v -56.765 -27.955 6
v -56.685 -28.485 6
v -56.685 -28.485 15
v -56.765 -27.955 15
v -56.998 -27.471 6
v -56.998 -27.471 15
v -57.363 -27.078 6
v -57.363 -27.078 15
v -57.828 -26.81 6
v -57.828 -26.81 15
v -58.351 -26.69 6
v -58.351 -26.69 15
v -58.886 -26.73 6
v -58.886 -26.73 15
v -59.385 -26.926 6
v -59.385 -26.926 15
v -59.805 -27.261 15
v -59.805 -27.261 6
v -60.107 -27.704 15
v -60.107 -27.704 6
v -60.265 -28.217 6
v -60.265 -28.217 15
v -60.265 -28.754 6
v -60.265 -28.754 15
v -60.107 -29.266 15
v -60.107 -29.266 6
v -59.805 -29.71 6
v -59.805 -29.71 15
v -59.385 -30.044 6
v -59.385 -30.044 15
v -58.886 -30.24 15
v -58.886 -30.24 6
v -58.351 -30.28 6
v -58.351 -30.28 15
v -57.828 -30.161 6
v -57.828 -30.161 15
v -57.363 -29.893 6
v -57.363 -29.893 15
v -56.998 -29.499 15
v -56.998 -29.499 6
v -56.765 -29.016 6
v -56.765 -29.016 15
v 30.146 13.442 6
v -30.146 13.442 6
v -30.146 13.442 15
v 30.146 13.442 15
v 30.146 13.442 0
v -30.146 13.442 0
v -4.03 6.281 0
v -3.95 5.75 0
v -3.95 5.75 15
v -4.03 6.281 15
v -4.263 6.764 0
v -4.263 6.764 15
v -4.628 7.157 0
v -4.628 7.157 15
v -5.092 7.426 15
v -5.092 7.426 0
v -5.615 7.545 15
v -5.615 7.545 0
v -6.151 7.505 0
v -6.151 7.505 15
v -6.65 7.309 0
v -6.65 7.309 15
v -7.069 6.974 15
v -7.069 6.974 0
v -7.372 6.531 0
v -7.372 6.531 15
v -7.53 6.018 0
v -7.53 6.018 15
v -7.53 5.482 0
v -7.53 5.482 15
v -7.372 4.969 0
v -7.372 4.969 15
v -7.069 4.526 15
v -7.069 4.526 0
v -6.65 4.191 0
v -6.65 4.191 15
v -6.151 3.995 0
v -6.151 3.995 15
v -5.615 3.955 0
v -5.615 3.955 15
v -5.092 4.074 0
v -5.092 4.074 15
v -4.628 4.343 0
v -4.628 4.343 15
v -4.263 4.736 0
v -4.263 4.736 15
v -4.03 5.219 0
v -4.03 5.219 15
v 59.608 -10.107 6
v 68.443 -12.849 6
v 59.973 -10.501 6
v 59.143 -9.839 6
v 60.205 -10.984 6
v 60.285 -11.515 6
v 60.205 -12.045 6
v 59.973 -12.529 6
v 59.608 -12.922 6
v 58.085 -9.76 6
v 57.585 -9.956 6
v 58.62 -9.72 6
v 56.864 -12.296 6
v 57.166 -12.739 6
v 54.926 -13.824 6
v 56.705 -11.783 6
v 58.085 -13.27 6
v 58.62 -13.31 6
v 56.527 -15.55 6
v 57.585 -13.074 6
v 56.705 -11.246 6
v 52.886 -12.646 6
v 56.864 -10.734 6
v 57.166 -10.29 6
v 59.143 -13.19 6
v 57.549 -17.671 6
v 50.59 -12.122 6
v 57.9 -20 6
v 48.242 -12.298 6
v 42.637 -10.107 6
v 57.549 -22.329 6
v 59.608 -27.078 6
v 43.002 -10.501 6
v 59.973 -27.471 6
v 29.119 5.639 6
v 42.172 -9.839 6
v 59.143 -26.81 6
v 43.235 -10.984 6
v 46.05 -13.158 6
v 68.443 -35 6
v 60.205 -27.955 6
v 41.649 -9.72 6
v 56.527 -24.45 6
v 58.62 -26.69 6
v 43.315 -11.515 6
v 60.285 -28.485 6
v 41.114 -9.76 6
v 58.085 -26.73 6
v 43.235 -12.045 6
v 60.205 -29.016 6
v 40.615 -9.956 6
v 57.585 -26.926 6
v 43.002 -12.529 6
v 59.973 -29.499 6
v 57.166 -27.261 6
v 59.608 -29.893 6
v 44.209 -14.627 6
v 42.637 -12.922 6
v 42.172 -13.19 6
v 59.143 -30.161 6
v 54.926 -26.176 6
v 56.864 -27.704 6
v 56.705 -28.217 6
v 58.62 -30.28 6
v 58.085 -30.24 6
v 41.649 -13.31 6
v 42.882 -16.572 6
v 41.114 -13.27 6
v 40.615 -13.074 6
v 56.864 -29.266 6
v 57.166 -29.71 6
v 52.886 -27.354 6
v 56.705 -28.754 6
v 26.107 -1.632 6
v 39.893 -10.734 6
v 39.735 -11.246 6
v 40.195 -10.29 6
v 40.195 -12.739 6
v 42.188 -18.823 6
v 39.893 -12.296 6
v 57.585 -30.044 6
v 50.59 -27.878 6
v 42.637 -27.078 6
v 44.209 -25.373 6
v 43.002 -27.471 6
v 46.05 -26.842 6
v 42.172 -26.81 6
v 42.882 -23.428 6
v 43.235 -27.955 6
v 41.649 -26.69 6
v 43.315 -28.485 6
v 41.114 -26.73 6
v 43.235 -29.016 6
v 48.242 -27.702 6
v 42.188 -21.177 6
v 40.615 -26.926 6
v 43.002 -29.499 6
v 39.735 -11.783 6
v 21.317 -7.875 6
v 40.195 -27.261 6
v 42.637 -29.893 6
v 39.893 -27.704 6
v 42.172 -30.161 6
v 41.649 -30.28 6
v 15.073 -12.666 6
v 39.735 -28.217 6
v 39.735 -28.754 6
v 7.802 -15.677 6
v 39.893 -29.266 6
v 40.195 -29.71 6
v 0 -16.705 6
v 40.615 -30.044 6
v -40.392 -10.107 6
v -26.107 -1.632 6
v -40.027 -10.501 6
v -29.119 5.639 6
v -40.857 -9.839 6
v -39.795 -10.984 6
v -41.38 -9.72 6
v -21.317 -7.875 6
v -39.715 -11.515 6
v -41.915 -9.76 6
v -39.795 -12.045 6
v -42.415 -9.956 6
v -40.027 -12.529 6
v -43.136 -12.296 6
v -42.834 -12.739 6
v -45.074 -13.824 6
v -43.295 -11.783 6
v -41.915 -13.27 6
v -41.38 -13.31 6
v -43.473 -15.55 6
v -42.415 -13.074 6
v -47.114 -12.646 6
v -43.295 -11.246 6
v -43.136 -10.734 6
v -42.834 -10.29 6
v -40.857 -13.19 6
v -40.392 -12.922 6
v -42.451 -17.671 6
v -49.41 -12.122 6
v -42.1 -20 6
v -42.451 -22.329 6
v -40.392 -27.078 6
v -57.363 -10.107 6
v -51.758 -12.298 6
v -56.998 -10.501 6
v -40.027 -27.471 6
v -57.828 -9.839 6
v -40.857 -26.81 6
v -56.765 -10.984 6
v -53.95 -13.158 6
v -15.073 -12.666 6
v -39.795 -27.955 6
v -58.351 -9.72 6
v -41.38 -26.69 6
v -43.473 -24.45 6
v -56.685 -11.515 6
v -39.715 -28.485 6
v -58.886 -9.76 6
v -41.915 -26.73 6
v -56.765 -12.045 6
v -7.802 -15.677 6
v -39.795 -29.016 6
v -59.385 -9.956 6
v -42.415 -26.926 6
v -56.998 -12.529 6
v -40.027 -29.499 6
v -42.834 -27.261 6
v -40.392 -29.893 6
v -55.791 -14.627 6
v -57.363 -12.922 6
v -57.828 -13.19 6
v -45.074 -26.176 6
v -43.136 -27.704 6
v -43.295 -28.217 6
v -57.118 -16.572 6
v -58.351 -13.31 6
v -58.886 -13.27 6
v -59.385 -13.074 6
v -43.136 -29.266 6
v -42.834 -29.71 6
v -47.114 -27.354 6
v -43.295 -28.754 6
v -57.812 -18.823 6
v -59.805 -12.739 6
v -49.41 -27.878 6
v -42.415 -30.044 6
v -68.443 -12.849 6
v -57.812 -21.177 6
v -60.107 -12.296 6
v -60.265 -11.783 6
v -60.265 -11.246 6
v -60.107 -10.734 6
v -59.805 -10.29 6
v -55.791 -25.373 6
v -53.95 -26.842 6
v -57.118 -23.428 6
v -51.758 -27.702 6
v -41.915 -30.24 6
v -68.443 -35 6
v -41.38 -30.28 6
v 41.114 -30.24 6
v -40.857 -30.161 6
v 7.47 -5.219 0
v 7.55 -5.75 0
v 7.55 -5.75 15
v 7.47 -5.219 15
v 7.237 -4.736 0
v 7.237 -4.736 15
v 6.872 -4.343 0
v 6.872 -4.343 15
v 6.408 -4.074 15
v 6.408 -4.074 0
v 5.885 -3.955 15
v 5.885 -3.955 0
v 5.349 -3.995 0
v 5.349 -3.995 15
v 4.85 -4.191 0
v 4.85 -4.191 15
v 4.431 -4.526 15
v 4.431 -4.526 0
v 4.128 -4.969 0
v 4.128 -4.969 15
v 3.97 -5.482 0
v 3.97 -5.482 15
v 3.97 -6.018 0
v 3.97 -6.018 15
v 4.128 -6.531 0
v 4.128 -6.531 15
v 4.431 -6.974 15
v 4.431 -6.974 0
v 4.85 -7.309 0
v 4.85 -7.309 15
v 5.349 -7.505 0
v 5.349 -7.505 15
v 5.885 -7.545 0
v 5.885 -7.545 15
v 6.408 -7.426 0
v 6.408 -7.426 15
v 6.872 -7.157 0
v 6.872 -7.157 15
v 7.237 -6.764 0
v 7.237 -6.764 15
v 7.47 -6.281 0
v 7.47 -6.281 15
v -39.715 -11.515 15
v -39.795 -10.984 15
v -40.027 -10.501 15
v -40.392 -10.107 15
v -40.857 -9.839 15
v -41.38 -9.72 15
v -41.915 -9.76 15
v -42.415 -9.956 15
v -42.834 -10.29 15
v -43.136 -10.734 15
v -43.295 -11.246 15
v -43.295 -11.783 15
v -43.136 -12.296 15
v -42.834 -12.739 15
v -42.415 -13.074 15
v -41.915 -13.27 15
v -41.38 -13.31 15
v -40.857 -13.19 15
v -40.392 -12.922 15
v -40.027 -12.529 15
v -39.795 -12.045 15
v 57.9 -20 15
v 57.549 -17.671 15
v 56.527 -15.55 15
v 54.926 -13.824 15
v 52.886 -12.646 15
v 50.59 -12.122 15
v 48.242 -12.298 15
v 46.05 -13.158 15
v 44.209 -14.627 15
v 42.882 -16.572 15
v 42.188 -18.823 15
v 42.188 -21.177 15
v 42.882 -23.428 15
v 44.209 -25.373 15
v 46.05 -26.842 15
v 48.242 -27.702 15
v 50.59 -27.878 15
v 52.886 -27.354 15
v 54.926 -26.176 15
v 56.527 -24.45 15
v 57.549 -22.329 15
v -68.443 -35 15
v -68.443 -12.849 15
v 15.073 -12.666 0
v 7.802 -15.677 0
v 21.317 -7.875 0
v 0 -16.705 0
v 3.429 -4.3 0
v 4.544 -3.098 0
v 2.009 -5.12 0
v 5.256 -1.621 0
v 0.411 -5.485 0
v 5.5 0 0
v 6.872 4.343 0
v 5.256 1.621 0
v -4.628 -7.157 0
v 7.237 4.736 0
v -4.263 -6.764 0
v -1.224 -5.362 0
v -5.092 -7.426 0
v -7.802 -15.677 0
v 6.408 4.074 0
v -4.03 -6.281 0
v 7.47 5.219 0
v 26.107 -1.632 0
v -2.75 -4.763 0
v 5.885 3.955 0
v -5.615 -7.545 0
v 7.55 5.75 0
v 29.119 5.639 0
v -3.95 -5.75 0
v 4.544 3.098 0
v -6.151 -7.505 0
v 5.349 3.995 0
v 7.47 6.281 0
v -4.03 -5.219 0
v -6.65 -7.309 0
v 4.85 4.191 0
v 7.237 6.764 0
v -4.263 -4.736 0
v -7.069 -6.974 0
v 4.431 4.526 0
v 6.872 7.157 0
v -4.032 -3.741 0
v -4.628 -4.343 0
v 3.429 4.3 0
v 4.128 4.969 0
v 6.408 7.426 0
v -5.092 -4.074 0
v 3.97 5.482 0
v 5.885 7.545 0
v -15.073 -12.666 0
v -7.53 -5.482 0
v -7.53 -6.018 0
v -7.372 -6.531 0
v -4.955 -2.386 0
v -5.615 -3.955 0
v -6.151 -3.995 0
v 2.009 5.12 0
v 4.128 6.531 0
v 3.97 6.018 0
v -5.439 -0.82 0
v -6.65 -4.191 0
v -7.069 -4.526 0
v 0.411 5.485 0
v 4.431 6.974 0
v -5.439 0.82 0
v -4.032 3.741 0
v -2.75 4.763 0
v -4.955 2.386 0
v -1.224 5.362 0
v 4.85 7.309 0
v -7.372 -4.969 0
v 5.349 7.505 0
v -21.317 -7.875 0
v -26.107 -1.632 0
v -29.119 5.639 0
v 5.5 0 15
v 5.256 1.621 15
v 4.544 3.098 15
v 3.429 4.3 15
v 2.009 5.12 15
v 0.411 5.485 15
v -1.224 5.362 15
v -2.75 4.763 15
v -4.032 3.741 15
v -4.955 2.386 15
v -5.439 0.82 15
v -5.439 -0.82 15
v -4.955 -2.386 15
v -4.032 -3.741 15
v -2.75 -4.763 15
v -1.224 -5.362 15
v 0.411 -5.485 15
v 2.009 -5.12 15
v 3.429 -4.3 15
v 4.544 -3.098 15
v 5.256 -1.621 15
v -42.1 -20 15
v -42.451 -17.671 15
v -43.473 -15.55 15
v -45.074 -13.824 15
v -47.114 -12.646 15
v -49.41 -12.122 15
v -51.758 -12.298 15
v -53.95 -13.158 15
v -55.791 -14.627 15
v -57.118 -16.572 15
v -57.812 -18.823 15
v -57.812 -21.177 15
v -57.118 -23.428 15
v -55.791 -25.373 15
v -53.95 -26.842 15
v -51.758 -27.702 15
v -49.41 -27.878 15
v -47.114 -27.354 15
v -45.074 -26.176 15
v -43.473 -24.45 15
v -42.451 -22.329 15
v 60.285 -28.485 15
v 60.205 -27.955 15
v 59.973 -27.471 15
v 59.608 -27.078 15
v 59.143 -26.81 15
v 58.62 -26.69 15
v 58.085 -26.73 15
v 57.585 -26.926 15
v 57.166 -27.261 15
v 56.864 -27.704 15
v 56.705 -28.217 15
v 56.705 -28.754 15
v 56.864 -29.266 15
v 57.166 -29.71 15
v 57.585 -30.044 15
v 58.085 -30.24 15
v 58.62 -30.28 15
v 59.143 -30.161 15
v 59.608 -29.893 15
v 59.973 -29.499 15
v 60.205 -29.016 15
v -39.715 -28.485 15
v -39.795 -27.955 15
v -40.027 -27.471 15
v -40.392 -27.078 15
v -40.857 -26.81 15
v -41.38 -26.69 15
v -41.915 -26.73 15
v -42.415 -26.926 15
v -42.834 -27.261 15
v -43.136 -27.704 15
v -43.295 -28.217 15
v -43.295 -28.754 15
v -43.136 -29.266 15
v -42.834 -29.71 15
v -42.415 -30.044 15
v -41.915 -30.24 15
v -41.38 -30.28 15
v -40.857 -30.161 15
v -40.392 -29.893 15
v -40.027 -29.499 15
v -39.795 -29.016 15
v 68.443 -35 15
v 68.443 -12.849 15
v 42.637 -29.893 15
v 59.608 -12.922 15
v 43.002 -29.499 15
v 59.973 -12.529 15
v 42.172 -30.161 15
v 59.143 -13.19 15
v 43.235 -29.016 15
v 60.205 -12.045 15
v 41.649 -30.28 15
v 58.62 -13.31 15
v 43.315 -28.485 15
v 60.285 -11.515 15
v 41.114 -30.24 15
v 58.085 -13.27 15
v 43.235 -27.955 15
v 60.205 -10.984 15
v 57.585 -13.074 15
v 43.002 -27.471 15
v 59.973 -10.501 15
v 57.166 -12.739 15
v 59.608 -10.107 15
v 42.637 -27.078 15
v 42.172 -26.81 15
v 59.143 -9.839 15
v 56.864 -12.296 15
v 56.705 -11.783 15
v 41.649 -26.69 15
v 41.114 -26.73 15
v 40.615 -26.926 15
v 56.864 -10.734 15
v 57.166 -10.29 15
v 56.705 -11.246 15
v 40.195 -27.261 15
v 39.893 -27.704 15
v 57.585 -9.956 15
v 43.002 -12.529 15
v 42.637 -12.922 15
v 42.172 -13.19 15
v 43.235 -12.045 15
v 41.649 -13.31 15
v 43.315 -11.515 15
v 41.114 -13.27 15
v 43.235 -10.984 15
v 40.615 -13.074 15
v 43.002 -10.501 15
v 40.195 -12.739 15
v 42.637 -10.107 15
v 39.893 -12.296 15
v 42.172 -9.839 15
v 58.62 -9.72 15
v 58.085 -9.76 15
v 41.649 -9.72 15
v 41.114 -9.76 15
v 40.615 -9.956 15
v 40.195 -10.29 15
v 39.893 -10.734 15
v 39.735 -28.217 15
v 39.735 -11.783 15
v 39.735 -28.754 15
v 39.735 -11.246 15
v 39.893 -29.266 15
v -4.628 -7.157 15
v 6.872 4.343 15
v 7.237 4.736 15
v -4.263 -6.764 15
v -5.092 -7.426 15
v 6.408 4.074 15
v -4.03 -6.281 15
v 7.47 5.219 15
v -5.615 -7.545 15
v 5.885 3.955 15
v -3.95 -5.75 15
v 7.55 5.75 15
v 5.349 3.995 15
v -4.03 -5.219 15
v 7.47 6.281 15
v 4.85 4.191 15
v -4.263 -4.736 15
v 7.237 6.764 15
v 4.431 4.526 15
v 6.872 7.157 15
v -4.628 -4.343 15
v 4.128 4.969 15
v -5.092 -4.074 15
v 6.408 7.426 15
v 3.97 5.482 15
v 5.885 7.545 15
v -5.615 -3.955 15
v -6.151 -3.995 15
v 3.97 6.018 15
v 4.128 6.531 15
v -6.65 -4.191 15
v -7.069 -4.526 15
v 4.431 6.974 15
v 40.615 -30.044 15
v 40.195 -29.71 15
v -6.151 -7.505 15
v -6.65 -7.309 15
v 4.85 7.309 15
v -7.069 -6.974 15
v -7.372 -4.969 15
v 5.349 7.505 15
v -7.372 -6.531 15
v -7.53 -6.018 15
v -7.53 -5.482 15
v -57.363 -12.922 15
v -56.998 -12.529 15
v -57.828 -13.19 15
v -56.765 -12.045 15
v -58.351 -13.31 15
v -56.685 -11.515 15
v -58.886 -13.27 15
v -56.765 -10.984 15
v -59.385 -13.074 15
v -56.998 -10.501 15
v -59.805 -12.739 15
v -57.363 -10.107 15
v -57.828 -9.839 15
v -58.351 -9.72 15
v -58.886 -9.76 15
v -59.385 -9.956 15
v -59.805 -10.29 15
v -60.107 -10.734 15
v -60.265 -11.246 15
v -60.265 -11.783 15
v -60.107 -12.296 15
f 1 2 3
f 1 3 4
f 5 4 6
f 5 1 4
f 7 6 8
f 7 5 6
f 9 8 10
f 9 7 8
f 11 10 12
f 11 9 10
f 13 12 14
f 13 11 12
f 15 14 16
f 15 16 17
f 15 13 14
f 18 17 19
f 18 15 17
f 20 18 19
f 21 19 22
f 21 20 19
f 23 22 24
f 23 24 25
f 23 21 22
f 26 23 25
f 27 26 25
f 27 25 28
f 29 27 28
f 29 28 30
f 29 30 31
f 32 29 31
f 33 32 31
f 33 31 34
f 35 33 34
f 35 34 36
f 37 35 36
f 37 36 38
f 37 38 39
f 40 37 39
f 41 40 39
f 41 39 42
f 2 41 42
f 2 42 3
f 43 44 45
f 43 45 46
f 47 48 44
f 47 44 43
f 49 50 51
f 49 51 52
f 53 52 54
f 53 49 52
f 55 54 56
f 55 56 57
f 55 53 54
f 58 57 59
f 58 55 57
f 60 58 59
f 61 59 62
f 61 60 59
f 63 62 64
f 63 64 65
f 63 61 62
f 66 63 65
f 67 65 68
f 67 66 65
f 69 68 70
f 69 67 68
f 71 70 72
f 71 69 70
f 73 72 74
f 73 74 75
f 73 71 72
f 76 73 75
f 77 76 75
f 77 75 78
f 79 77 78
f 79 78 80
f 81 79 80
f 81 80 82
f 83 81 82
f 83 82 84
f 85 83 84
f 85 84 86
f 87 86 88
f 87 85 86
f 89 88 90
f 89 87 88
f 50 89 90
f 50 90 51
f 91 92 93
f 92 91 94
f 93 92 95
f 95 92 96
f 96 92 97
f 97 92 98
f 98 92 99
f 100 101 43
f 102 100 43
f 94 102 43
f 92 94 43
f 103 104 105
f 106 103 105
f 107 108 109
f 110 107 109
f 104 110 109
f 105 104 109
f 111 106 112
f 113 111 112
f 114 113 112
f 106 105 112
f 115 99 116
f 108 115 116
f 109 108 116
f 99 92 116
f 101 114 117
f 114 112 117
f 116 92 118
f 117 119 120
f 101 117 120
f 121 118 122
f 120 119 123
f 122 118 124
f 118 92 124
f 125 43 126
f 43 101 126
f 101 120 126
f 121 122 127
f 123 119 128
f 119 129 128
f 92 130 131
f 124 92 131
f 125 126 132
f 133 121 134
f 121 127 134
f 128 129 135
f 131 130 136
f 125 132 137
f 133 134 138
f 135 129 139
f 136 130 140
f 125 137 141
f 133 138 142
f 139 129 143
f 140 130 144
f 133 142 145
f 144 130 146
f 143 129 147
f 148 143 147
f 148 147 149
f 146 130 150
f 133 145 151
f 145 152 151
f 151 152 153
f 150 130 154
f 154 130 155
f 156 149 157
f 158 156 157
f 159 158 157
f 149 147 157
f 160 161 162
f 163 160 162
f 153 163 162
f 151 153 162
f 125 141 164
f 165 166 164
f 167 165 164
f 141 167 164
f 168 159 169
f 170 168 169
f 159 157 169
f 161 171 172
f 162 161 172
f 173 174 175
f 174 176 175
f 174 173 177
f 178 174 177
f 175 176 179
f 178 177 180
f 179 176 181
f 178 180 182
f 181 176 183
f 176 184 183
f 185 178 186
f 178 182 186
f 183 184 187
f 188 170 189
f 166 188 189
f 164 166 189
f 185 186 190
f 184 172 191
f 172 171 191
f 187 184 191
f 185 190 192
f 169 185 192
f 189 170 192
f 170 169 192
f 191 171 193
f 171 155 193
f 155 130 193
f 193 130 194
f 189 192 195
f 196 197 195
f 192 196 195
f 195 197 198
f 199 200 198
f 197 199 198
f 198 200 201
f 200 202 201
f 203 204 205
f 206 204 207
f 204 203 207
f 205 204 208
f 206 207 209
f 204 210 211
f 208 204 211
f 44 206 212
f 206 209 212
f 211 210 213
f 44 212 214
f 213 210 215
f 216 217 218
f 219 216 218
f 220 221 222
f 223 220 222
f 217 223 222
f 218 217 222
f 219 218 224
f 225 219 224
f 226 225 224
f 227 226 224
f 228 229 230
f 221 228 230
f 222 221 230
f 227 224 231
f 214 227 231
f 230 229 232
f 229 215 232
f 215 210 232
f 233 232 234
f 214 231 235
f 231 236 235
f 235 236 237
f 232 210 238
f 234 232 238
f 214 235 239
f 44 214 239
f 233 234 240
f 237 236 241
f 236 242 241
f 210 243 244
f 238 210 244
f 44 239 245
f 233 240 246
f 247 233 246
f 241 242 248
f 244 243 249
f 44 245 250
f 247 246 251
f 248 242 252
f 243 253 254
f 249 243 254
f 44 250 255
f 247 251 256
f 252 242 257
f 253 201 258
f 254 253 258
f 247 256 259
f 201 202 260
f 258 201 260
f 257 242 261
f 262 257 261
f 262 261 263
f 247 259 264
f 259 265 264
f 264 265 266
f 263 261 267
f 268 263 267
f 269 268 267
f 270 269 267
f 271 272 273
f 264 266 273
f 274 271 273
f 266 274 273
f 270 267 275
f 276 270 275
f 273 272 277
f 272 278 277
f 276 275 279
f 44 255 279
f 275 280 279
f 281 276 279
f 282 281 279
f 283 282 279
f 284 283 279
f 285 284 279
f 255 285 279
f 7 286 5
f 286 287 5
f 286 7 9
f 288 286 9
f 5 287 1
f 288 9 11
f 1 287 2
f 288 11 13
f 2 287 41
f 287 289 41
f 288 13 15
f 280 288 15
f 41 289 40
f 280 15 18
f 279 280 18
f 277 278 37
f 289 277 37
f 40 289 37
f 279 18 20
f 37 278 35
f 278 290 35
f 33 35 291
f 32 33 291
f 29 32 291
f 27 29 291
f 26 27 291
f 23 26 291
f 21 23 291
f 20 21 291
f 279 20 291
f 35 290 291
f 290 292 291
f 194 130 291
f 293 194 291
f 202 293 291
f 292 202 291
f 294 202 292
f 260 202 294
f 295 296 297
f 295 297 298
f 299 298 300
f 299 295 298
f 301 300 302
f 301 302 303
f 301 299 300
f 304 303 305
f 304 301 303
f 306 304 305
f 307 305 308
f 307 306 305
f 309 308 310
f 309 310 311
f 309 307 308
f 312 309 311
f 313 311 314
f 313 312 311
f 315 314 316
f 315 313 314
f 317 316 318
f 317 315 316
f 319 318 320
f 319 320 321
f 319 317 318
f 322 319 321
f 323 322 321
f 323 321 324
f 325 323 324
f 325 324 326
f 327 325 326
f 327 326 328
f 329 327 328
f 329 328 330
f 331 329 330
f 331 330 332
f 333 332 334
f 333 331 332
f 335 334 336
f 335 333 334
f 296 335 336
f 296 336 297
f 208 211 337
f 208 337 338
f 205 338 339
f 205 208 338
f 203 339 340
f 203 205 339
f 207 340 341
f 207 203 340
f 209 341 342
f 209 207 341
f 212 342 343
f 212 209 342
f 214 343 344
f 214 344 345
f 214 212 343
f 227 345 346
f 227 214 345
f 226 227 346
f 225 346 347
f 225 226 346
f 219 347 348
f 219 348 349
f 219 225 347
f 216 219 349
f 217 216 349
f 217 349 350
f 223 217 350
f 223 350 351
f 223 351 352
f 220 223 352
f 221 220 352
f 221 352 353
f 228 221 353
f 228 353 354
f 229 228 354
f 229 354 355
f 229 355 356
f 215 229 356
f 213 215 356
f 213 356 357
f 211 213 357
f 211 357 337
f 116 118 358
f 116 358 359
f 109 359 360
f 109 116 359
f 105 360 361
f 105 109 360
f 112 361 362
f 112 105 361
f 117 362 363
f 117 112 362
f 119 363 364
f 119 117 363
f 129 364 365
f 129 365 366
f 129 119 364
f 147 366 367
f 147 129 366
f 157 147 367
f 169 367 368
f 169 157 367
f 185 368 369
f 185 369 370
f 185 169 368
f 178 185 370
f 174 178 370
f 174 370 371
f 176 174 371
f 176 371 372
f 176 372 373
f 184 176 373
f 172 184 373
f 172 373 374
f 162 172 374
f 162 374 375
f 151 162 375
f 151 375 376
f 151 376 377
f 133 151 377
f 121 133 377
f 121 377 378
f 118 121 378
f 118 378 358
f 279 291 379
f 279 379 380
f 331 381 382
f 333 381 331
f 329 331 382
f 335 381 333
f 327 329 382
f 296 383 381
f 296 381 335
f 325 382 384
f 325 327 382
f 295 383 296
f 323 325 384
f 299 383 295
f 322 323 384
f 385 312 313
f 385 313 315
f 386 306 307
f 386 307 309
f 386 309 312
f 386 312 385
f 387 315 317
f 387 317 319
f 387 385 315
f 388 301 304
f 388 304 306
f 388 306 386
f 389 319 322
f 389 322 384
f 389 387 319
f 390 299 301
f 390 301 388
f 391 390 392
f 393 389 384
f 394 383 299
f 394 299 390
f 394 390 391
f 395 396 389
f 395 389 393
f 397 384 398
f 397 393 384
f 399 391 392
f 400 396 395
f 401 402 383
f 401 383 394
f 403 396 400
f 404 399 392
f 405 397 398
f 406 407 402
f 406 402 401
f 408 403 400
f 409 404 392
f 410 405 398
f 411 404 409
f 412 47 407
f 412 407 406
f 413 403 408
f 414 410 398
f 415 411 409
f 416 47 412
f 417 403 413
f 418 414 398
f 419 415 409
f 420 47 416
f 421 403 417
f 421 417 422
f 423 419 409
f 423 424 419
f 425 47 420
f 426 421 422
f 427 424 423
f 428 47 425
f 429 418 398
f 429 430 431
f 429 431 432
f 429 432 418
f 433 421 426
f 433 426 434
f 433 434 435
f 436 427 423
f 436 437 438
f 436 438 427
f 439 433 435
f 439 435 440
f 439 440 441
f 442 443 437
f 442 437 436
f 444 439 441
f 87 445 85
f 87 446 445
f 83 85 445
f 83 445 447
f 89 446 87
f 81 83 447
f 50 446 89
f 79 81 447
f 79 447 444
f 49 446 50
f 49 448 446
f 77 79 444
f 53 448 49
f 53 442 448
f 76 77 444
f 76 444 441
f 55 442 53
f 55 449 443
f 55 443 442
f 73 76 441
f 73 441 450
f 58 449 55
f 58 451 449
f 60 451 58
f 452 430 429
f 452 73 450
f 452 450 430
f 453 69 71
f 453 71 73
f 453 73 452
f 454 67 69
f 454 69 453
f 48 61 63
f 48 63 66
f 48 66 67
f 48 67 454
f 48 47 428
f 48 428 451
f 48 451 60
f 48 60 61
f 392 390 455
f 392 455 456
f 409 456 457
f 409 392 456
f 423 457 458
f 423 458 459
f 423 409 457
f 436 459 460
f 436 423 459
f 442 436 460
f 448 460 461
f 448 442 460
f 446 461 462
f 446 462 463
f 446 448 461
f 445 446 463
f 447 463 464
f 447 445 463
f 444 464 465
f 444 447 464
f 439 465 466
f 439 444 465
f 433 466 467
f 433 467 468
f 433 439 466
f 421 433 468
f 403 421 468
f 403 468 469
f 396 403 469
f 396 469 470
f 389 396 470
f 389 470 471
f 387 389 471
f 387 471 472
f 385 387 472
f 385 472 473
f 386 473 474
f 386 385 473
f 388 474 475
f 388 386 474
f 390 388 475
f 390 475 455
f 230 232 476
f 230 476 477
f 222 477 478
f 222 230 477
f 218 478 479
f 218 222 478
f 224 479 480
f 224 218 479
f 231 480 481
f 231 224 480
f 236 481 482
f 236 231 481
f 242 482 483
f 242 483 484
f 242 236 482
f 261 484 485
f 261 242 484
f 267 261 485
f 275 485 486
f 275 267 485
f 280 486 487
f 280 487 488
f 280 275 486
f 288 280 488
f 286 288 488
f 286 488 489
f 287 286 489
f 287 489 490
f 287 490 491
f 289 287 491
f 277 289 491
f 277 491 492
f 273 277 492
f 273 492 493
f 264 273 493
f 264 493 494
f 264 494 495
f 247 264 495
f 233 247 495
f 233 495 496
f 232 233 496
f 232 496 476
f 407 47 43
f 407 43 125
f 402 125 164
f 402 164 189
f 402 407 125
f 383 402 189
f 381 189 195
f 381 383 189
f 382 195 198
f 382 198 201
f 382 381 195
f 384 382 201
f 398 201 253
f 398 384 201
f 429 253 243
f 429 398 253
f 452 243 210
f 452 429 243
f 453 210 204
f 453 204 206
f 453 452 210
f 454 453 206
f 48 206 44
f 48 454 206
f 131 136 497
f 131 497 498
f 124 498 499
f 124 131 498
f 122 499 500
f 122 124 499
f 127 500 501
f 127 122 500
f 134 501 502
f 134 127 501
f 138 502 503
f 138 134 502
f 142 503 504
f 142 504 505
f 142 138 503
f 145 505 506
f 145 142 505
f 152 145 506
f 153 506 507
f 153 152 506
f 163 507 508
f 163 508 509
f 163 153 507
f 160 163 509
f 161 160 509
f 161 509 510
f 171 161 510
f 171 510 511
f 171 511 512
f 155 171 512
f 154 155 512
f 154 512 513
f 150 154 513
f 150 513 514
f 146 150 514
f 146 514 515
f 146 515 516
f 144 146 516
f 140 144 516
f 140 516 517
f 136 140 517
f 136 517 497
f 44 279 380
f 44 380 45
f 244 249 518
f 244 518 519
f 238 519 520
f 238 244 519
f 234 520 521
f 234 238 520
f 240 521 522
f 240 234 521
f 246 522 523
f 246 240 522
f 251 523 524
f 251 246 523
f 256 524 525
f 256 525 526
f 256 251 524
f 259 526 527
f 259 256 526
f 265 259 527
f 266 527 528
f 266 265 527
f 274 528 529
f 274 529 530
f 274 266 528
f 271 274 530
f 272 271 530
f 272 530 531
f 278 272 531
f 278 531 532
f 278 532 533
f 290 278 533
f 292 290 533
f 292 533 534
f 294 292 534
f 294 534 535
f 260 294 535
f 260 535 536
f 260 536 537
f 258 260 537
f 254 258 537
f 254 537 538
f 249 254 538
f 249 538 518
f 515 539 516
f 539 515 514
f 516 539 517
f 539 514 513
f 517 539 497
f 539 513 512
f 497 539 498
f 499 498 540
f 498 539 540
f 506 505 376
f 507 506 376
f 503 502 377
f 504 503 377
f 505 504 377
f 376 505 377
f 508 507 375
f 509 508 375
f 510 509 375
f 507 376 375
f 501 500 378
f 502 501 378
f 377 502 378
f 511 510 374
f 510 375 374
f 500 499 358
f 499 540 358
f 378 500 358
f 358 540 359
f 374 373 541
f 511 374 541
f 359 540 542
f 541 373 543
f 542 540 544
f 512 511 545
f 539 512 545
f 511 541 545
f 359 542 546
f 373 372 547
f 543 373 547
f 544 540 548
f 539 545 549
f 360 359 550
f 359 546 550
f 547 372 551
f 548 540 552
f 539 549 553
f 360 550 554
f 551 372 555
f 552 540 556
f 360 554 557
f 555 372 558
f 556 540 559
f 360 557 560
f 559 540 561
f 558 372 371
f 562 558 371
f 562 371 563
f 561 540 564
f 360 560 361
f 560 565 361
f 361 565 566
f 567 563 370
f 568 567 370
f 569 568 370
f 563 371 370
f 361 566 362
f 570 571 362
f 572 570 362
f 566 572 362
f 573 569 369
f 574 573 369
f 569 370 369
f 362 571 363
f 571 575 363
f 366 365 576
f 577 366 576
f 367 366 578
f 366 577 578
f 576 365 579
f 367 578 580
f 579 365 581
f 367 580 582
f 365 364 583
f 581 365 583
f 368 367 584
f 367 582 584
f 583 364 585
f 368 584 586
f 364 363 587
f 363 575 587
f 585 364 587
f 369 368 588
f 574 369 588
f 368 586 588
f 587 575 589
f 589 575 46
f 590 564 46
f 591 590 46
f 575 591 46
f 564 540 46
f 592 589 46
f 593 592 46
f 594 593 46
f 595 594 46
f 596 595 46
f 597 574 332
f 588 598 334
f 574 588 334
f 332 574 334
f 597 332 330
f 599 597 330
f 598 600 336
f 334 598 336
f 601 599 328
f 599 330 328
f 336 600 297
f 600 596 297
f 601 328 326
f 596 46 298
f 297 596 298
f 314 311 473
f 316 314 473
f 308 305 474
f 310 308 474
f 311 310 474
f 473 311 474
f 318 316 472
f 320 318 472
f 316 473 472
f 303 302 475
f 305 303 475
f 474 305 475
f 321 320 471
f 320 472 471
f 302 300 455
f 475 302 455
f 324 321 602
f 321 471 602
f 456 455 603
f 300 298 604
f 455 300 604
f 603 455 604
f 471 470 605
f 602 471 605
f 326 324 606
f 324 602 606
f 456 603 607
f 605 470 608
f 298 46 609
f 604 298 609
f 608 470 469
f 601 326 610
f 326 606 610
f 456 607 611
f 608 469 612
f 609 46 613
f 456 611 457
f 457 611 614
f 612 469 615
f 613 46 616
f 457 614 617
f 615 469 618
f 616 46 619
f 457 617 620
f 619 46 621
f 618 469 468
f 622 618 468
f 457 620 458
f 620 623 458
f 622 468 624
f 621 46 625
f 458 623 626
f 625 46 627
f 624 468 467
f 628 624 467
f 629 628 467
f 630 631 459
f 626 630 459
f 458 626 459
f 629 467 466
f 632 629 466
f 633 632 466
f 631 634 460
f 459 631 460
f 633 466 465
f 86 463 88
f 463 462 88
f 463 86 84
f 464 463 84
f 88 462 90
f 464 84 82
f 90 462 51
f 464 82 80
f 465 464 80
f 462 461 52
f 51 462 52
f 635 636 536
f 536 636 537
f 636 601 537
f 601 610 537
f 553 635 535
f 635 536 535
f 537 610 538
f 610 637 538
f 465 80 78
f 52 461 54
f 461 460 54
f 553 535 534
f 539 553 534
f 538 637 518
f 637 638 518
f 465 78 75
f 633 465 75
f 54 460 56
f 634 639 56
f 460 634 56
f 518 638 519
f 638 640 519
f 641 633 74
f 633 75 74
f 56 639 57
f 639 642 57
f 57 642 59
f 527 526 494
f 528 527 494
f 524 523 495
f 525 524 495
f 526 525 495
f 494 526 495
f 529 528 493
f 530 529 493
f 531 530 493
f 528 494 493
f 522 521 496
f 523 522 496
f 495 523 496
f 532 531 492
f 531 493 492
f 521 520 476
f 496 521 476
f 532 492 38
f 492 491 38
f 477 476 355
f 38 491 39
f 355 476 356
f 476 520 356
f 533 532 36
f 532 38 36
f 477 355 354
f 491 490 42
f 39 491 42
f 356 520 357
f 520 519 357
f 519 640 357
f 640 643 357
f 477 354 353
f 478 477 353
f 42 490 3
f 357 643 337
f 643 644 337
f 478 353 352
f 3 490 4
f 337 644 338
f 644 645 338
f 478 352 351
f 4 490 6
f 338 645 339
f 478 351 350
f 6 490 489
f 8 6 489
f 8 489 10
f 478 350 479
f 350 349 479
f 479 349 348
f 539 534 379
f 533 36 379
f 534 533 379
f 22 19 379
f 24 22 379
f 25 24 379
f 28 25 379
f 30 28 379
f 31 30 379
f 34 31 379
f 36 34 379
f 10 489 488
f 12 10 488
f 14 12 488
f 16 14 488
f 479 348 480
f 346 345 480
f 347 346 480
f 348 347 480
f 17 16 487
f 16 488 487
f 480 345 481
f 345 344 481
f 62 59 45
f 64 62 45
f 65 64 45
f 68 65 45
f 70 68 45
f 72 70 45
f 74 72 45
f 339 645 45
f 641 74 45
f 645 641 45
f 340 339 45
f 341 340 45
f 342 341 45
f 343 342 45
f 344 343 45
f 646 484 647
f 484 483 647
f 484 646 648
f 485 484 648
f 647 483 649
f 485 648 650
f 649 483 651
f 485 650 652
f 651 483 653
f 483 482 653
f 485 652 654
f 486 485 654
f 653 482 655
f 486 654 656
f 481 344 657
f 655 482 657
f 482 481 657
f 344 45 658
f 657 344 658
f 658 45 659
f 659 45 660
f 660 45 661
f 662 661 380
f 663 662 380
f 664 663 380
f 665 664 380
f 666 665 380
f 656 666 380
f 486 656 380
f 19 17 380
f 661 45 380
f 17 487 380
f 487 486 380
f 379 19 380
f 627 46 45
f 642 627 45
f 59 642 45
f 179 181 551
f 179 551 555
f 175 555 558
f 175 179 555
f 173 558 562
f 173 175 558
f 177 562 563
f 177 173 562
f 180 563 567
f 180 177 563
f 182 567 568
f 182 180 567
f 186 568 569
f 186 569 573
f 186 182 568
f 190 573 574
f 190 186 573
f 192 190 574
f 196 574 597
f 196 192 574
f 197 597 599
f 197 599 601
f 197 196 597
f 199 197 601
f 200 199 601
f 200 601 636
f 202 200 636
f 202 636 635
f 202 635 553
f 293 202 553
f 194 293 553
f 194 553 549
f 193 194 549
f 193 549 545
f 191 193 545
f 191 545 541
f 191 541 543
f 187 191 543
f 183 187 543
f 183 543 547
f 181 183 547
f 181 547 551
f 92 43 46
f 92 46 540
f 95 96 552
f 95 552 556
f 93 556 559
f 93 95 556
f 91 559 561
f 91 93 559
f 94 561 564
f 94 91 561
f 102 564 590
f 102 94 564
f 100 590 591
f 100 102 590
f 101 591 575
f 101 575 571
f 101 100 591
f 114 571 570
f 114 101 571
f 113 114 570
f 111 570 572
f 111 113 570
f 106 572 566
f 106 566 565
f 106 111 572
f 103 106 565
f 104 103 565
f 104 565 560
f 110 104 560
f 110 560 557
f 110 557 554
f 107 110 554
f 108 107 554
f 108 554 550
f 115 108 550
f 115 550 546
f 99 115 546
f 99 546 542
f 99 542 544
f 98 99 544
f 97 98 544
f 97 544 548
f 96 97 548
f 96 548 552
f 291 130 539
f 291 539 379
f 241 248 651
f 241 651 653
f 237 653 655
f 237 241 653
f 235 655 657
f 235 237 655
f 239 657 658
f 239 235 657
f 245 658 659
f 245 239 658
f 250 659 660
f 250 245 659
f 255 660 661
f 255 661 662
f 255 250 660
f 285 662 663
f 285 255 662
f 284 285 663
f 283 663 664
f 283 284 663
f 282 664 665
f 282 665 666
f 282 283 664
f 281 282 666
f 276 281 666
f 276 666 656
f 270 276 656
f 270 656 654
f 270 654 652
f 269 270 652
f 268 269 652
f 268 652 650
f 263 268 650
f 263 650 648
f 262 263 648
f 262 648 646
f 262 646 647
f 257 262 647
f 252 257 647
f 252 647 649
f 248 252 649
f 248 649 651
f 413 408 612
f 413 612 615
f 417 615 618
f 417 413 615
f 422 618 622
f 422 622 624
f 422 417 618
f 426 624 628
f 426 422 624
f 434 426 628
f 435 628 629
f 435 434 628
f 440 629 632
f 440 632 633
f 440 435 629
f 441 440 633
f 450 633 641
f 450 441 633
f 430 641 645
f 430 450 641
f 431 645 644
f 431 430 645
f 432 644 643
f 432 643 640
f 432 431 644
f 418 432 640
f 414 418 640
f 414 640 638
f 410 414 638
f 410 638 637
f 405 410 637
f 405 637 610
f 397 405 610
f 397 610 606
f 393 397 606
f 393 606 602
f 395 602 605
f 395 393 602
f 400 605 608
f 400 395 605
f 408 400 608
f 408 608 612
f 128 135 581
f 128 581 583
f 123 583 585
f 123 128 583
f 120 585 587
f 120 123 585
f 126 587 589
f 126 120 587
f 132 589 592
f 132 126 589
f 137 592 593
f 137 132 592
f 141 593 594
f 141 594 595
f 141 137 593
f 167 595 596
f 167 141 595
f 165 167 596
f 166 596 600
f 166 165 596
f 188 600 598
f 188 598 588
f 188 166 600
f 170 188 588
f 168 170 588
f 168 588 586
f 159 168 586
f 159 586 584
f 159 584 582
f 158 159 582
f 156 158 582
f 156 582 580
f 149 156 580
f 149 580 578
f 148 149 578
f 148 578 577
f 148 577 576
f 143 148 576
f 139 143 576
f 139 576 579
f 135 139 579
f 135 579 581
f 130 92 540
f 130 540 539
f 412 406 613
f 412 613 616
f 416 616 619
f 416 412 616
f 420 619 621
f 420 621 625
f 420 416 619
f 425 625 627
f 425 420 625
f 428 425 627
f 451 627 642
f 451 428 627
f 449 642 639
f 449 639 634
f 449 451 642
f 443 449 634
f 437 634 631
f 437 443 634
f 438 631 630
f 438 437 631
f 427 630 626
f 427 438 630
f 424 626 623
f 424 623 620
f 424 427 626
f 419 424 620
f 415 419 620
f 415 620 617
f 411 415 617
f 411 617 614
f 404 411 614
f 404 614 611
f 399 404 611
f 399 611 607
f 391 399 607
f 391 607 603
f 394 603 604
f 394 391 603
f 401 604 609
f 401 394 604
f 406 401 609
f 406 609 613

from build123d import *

# Parameters (mm, degrees)
SKETCH_R     = 5.5
SKETCH_R_2   = 1.8
SKETCH_R_3   = 7.9
PAD_DEPTH    = 15
POCKET_DEPTH = 6


with BuildPart() as part:
    # Sketch → Pad (new body)
    with BuildSketch(Plane.XY):
        Polygon((-68.442958, -12.848852), (-30.14609, 13.441504), (30.14609, 13.441504), (68.442958, -12.848852), (68.442958, -35), (-68.442958, -35), align=None)
        Circle(SKETCH_R, mode=Mode.SUBTRACT)
        with Locations((-5.75, 5.75)):
            Circle(SKETCH_R_2, mode=Mode.SUBTRACT)
        with Locations((5.75, 5.75)):
            Circle(SKETCH_R_2, mode=Mode.SUBTRACT)
        with Locations((5.75, -5.75)):
            Circle(SKETCH_R_2, mode=Mode.SUBTRACT)
        with Locations((-5.75, -5.75)):
            Circle(SKETCH_R_2, mode=Mode.SUBTRACT)
        with Locations((-58.485281, -28.485281)):
            Circle(SKETCH_R_2, mode=Mode.SUBTRACT)
        with Locations((-41.514719, -11.514719)):
            Circle(SKETCH_R_2, mode=Mode.SUBTRACT)
        with Locations((-41.514719, -28.485281)):
            Circle(SKETCH_R_2, mode=Mode.SUBTRACT)
        with Locations((-58.485281, -11.514719)):
            Circle(SKETCH_R_2, mode=Mode.SUBTRACT)
        with Locations((-50, -20)):
            Circle(SKETCH_R_3, mode=Mode.SUBTRACT)
        with Locations((41.514719, -28.485281)):
            Circle(SKETCH_R_2, mode=Mode.SUBTRACT)
        with Locations((58.485281, -11.514719)):
            Circle(SKETCH_R_2, mode=Mode.SUBTRACT)
        with Locations((58.485281, -28.485281)):
            Circle(SKETCH_R_2, mode=Mode.SUBTRACT)
        with Locations((41.514719, -11.514719)):
            Circle(SKETCH_R_2, mode=Mode.SUBTRACT)
        with Locations((50, -20)):
            Circle(SKETCH_R_3, mode=Mode.SUBTRACT)
    extrude(amount=PAD_DEPTH)

    # Sketch001 → Pocket (cut)
    with BuildSketch(Plane(origin=(0, 0, 0), x_dir=(1, 0, 0), z_dir=(0, 0, -1))):
        with BuildLine():
            Line((-30.14609, -13.441504), (-68.442958, 12.848852))
            Line((-68.442958, 12.848852), (-68.442958, 35))
            Line((-68.442958, 35), (68.442958, 35))
            Line((68.442958, 35), (68.442958, 12.848852))
            Line((68.442958, 12.848852), (30.14609, -13.441504))
            ThreePointArc((30.14609, -13.441504), (0, 16.704586), (-30.14609, -13.441504))
        make_face()
    extrude(amount=-POCKET_DEPTH, mode=Mode.SUBTRACT)


solid = part.part
